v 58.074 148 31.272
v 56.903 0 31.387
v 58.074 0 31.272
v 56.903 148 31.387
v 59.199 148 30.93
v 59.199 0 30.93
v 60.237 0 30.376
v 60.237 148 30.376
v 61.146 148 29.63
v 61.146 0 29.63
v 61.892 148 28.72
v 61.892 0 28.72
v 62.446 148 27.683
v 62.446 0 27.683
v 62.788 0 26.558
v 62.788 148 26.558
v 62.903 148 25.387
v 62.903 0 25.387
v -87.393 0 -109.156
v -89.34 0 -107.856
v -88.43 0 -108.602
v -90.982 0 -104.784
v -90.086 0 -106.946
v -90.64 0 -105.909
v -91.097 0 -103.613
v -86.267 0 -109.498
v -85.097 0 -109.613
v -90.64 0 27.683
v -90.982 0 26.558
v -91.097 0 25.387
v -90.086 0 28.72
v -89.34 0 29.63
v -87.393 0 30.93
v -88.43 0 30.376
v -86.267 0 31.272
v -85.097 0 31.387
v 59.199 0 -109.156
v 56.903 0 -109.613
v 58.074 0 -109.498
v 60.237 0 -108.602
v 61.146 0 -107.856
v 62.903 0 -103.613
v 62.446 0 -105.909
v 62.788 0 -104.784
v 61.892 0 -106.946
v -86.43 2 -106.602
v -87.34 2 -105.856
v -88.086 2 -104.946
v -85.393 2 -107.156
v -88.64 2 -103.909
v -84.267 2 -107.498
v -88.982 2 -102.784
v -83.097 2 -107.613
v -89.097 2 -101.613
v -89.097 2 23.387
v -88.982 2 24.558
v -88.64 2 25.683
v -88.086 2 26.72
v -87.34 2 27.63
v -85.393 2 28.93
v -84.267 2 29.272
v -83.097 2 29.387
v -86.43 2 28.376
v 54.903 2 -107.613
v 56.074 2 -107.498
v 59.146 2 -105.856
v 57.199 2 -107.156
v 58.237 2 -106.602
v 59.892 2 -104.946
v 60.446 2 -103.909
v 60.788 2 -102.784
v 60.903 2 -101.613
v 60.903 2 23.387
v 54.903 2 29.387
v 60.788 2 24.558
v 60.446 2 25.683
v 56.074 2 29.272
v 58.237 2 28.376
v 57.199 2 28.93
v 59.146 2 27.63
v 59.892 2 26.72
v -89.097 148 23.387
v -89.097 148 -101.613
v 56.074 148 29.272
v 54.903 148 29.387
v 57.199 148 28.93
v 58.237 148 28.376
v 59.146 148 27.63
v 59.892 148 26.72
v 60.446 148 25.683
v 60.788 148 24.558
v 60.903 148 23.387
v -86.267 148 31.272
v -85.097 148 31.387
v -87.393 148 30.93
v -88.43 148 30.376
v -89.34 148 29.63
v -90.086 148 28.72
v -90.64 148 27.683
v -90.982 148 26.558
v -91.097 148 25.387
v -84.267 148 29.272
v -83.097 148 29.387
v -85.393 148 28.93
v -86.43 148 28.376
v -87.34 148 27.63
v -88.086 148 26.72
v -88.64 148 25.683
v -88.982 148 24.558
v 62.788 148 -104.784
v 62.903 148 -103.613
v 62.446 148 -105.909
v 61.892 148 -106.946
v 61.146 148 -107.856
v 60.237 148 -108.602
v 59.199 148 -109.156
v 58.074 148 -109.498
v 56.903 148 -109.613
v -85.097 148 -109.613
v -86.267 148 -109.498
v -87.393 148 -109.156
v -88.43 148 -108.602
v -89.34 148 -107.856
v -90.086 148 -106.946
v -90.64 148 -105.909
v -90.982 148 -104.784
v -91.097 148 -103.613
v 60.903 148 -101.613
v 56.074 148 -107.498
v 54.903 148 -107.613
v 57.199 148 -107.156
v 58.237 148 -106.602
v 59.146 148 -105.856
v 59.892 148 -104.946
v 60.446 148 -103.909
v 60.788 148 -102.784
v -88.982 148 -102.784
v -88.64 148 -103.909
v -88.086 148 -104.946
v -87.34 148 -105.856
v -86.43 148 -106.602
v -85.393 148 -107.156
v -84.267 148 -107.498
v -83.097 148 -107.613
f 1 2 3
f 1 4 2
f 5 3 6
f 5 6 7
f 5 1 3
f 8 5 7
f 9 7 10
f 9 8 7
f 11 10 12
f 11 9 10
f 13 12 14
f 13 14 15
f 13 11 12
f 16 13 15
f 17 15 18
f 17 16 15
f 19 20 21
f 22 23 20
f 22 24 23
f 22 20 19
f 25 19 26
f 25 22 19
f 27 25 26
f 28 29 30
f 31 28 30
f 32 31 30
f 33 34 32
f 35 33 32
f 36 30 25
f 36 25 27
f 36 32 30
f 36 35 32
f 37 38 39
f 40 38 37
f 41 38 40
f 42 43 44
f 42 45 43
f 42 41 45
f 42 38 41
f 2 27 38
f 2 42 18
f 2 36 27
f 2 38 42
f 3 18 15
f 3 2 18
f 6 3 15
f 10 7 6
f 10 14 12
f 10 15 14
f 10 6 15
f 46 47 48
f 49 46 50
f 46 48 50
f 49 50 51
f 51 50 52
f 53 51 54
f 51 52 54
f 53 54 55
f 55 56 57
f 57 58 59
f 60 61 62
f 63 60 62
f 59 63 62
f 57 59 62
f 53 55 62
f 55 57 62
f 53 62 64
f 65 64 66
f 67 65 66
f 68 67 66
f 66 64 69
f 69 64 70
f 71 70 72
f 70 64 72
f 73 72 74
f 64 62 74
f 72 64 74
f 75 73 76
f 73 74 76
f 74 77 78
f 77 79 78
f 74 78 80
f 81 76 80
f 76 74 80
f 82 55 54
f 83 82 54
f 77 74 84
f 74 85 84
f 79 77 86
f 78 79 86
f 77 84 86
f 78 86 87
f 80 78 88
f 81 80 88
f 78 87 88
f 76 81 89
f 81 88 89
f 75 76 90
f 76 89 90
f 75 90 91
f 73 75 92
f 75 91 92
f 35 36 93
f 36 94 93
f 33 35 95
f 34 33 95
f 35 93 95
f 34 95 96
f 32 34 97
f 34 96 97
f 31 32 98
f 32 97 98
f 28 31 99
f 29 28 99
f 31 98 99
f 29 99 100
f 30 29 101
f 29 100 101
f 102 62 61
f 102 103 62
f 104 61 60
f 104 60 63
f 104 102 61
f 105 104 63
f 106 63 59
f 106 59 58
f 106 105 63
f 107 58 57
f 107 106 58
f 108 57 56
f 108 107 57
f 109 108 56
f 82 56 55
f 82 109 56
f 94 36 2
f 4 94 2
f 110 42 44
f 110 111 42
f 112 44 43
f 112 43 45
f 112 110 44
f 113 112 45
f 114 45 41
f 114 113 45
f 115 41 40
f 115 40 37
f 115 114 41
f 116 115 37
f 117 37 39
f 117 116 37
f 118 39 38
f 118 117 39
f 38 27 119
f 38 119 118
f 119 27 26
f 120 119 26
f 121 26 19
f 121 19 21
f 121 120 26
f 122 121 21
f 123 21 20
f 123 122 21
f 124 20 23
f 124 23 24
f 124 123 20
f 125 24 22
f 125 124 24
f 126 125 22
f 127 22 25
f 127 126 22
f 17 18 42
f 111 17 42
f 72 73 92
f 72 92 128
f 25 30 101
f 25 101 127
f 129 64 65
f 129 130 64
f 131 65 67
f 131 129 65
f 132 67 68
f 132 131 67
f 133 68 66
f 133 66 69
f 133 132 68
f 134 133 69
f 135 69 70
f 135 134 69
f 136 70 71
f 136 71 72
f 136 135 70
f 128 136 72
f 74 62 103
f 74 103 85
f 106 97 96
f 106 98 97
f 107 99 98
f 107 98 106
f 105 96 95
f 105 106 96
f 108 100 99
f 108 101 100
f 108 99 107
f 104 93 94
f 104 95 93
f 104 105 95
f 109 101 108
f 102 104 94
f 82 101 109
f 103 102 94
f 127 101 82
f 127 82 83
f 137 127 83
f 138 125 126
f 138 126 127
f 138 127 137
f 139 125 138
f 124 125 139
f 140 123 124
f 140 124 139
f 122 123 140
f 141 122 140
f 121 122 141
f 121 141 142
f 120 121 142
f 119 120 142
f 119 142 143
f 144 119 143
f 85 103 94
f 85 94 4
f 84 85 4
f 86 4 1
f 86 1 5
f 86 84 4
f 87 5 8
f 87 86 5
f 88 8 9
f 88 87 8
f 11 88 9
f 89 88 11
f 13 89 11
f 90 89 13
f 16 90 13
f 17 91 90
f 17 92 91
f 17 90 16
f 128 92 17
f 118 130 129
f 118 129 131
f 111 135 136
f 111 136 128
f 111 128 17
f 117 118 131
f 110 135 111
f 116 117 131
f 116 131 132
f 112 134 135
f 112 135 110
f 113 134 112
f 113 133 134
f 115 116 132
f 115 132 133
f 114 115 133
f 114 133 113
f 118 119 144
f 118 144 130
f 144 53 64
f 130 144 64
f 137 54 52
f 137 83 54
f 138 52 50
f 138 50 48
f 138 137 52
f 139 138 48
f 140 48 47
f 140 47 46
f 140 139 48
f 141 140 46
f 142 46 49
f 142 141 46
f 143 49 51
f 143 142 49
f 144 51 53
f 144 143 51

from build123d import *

# Parameters (mm, degrees)
SKETCH1_W           = 154
SKETCH1_H           = 141
SKETCH1_W_2         = 150
SKETCH1_H_2         = 137
BOSS_EXTRUDE1_DEPTH = 148
SKETCH4_W           = 150
SKETCH4_H           = 137
BOSS_EXTRUDE2_DEPTH = 2
FILLET1_R           = 6
FILLET2_R           = 6
FILLET3_R           = 6
FILLET4_R           = 6
FILLET5_R           = 6
FILLET6_R           = 6
FILLET7_R           = 6
FILLET8_R           = 6


with BuildPart() as part:
    # Sketch1 → Boss-Extrude1 (new body)
    with BuildSketch(Plane(origin=(0, 0, 0), x_dir=(1, 0, 0), z_dir=(0, 1, 0))):
        with Locations((-14.096869638, 39.113007283)):
            Rectangle(SKETCH1_W, SKETCH1_H)
        with Locations((-14.096869638, 39.113007283)):
            Rectangle(SKETCH1_W_2, SKETCH1_H_2, mode=Mode.SUBTRACT)
    extrude(amount=BOSS_EXTRUDE1_DEPTH)

    # Sketch4 → Boss-Extrude2 (add)
    with BuildSketch(Plane.XZ):
        with Locations((-14.096869638, -39.113007283)):
            Rectangle(SKETCH4_W, SKETCH4_H)
    extrude(amount=-BOSS_EXTRUDE2_DEPTH)

    # Fillet1
    fillet1_edges = [part.edges().sort_by_distance(p)[0] for p in [
        (62.903130362, 74, 31.386992717),
    ]]
    fillet(fillet1_edges, radius=FILLET1_R)

    # Fillet2
    fillet2_edges = [part.edges().sort_by_distance(p)[0] for p in [
        (60.903130362, 75, 29.386992717),
    ]]
    fillet(fillet2_edges, radius=FILLET2_R)

    # Fillet3
    fillet3_edges = [part.edges().sort_by_distance(p)[0] for p in [
        (-89.096869638, 75, 29.386992717),
    ]]
    fillet(fillet3_edges, radius=FILLET3_R)

    # Fillet4
    fillet4_edges = [part.edges().sort_by_distance(p)[0] for p in [
        (-91.096869638, 74, 31.386992717),
    ]]
    fillet(fillet4_edges, radius=FILLET4_R)

    # Fillet5
    fillet5_edges = [part.edges().sort_by_distance(p)[0] for p in [
        (62.903130362, 74, -109.613007283),
    ]]
    fillet(fillet5_edges, radius=FILLET5_R)

    # Fillet6
    fillet6_edges = [part.edges().sort_by_distance(p)[0] for p in [
        (-91.096869638, 74, -109.613007283),
    ]]
    fillet(fillet6_edges, radius=FILLET6_R)

    # Fillet7
    fillet7_edges = [part.edges().sort_by_distance(p)[0] for p in [
        (-89.096869638, 75, -107.613007283),
    ]]
    fillet(fillet7_edges, radius=FILLET7_R)

    # Fillet8
    fillet8_edges = [part.edges().sort_by_distance(p)[0] for p in [
        (60.903130362, 75, -107.613007283),
    ]]
    fillet(fillet8_edges, radius=FILLET8_R)


solid = part.part
